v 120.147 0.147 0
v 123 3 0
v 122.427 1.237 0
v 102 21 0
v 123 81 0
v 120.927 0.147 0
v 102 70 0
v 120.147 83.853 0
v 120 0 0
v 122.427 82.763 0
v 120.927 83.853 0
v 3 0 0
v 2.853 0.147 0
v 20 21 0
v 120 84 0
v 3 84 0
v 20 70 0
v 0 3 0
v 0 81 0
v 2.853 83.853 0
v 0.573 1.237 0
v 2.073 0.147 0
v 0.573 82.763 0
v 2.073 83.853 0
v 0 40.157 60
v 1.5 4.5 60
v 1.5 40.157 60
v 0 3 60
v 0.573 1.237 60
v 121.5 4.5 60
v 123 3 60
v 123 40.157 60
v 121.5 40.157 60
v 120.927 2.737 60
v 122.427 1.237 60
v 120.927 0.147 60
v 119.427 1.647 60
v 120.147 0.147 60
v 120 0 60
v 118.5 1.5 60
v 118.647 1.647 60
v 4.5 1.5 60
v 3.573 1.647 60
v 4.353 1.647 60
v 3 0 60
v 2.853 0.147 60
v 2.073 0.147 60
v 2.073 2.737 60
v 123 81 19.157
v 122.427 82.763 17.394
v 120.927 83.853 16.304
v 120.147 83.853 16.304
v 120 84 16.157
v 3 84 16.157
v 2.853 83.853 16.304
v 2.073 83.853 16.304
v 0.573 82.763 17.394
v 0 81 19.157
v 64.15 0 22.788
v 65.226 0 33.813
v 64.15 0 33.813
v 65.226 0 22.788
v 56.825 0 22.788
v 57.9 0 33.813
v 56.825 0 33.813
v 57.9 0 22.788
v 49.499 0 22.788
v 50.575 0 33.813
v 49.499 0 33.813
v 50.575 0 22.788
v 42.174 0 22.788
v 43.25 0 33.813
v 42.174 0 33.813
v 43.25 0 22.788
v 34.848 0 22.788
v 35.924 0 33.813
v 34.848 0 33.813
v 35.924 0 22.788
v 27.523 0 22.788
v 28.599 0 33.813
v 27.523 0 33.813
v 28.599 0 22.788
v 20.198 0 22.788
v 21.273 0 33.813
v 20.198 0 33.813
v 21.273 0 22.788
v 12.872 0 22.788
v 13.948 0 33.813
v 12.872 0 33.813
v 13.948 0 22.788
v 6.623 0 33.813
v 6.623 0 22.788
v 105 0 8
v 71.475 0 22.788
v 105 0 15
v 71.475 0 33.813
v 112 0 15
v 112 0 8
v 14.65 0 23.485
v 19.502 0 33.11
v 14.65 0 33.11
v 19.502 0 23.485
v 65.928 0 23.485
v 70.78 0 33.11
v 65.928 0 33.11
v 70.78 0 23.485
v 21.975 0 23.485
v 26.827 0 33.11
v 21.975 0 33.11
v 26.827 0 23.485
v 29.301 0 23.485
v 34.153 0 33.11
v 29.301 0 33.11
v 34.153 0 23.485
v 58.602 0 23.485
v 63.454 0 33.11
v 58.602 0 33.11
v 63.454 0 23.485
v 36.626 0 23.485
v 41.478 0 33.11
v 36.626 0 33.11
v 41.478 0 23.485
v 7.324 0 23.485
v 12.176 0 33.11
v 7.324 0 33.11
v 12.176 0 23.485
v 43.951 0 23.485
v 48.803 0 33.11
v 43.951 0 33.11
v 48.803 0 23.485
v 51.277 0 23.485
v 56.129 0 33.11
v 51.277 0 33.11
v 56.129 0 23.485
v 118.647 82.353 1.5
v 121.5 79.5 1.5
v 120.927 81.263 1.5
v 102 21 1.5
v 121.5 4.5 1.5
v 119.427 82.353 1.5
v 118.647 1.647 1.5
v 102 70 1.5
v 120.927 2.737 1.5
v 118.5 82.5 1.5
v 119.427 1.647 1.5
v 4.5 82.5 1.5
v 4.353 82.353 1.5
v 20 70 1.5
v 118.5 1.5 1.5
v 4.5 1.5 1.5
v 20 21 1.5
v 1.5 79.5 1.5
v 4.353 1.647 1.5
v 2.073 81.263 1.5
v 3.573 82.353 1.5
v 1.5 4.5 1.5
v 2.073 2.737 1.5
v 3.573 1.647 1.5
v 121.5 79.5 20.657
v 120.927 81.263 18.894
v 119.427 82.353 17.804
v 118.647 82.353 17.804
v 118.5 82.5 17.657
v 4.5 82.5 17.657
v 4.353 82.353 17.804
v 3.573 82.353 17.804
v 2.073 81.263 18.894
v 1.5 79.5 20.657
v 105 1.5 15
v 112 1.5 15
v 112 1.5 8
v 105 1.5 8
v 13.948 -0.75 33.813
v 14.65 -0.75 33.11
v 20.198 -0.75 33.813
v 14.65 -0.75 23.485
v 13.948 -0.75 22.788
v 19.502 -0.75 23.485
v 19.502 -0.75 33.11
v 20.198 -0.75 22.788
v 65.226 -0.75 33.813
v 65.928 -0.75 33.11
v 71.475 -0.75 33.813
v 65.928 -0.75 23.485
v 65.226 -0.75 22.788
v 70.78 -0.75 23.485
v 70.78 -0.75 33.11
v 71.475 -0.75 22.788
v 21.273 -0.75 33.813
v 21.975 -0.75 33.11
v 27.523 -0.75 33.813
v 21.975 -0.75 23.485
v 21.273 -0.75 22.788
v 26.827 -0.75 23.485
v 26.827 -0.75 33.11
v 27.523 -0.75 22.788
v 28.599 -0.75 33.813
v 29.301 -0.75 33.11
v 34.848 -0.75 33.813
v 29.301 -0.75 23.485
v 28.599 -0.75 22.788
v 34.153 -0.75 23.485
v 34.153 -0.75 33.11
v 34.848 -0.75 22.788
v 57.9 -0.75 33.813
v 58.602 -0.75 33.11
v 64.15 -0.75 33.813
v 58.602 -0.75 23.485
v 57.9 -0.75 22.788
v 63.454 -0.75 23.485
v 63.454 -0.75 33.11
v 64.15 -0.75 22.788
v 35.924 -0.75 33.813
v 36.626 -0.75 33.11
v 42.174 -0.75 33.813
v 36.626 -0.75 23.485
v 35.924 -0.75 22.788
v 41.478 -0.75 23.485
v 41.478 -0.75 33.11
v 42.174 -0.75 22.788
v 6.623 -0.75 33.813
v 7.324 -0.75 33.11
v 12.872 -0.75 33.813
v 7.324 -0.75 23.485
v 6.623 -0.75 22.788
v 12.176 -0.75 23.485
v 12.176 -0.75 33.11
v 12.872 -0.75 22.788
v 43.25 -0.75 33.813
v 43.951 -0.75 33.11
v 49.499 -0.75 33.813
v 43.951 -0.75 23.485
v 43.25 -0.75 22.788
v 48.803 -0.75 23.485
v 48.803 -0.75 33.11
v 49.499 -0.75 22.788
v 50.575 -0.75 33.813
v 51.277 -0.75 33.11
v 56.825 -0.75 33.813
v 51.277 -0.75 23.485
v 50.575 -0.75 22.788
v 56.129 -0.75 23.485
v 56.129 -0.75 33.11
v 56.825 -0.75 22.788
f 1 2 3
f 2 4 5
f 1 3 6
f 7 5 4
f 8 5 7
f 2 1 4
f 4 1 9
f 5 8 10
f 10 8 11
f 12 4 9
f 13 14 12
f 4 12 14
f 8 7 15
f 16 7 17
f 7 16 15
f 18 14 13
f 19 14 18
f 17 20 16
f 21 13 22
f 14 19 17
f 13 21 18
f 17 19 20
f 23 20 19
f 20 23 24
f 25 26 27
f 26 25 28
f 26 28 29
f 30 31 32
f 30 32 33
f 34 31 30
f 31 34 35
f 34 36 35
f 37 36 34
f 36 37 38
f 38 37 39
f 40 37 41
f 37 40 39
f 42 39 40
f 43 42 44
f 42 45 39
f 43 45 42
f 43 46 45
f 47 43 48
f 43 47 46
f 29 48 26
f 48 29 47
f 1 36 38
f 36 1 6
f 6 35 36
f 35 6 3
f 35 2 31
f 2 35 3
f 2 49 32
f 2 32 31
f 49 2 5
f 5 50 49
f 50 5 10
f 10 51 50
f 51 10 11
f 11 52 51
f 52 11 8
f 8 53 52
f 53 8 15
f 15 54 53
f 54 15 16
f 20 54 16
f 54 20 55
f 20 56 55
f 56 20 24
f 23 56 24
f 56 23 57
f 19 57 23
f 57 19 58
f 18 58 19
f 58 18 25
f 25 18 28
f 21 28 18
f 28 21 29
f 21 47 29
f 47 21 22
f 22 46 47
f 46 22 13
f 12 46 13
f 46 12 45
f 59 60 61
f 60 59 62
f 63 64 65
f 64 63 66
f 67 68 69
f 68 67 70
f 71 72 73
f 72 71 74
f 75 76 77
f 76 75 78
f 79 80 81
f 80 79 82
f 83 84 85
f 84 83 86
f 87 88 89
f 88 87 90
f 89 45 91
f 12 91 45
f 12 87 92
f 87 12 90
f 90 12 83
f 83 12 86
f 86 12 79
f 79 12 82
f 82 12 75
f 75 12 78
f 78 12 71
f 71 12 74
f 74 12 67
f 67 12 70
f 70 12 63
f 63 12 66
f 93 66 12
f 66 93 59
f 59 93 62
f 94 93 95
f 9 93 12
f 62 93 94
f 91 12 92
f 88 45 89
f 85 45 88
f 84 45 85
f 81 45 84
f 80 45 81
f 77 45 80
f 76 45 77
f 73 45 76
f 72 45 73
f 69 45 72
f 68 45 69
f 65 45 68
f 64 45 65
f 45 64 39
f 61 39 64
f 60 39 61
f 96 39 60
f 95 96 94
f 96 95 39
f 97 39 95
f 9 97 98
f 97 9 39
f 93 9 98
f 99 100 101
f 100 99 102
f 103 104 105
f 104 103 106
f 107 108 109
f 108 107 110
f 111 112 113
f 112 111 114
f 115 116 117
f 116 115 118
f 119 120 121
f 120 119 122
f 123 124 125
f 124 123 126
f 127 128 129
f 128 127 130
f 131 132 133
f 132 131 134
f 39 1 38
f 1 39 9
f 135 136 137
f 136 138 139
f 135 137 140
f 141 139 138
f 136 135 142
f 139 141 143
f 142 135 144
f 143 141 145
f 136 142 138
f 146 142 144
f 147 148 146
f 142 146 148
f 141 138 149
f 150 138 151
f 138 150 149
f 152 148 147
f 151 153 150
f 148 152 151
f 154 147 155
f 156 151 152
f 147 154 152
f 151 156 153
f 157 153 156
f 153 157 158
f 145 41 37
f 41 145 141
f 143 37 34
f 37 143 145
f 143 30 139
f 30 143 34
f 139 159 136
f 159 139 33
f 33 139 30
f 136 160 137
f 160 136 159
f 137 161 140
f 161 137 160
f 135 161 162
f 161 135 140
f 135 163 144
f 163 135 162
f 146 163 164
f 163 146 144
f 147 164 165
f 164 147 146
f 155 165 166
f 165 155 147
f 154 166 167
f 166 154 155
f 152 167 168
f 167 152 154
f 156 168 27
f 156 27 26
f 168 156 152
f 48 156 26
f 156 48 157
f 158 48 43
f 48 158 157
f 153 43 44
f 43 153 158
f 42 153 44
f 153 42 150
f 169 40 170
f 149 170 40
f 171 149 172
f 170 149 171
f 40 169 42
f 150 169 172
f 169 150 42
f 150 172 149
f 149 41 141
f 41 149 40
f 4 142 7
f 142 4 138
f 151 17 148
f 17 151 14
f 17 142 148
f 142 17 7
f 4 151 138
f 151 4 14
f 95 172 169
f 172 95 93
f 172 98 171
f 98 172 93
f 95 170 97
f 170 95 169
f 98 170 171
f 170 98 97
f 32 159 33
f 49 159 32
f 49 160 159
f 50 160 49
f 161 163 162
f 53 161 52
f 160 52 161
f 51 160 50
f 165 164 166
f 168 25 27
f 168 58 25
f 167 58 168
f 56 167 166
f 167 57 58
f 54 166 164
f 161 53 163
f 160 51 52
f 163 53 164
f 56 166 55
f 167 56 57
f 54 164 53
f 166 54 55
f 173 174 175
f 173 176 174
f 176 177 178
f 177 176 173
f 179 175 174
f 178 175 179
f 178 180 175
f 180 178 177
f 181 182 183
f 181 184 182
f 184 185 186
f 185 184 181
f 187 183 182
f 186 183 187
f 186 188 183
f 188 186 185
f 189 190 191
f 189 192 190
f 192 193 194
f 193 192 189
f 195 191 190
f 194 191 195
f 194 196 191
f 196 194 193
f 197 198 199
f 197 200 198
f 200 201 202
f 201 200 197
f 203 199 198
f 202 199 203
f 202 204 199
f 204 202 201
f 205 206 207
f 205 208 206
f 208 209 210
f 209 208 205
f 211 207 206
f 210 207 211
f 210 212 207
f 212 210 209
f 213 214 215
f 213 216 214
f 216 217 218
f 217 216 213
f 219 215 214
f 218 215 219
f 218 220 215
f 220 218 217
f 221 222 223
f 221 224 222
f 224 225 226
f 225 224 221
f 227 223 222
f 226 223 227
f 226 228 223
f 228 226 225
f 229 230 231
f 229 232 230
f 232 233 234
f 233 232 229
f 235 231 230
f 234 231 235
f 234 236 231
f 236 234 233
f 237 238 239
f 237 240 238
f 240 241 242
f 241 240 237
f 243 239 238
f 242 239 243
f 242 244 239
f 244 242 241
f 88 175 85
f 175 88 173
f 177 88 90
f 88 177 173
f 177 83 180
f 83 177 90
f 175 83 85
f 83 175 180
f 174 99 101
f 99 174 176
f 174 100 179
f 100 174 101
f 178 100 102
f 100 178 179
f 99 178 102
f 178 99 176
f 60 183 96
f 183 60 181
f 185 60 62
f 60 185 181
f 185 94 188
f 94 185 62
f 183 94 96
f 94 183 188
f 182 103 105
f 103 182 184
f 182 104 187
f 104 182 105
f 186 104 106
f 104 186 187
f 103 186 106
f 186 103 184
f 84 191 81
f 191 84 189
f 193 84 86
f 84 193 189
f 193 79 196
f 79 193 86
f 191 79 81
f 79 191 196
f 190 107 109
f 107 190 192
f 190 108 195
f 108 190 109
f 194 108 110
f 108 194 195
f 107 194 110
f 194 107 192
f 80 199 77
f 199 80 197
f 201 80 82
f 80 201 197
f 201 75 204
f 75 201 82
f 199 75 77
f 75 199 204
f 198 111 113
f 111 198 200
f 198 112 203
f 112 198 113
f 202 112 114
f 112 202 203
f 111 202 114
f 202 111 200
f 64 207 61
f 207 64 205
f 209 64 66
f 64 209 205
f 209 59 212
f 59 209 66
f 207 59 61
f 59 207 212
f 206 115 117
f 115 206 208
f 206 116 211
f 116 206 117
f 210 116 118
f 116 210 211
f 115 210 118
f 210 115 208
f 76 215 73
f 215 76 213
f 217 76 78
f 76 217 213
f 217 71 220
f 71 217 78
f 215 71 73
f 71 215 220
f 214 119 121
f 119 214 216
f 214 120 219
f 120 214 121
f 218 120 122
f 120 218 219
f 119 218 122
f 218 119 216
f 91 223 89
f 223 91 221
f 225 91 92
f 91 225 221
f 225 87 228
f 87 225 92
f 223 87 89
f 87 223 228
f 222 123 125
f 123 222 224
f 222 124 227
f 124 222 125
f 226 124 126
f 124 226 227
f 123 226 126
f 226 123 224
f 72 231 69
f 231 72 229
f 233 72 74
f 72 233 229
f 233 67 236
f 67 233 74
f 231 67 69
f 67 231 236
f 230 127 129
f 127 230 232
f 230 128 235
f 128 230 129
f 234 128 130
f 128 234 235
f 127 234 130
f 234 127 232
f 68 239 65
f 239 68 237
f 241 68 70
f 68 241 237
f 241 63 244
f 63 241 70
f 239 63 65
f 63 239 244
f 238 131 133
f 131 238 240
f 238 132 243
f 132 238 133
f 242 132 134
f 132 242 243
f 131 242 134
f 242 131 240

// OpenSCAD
BaseWidth = 123;
BaseDepth = 84;
BaseHeight = 60;
CornerRadius = 3;
WallThickness = 1.5;
LCDScreenWidth=82;
LCDScreenHeight=49;
LCDScreenX=20;
LCDScreenY=21;

module RoundedRectangle($Width=BaseWidth, $Depth=BaseDepth, $Radius=CornerRadius) 
{
    polygon(points = [[$Radius, 0], [$Width-$Radius, 0],[$Width, $Radius], [$Width, $Depth-$Radius], [$Width-$Radius, $Depth], [$Radius, $Depth], [0, $Depth-$Radius], [0, $Radius]], paths=[[0,1,2,3,4,5,6,7]]);
        
    translate([$Radius,$Radius,0]){
        circle(r=$Radius);
    }        
    translate([$Width-$Radius,$Radius,0]){
        circle(r=$Radius);
    }
    
    translate([$Width-$Radius,$Depth-$Radius,0]){ 
        circle(r=$Radius);
    }
    
    translate([$Radius,$Depth-$Radius,0]){ 
        circle(r=$Radius);
    }
}


module base3D($Width=BaseWidth, $Depth=BaseDepth, $Height=BaseHeight, $Radius=CornerRadius, $Thickness=WallThickness)
{
    difference()
    {
        linear_extrude(height = $Height, center = false, convexity = 0, twist = 0)
        RoundedRectangle($Width, $Depth, $Radius);
        translate([$Thickness, $Thickness, $Thickness]) {
        linear_extrude(height = $Height, center = false, convexity = 0, twist = 0)
        RoundedRectangle($Width-$Thickness*2, $Depth-$Thickness*2, $Radius);
        }
    }
}


difference() {
    base3D(BaseWidth, BaseDepth, BaseHeight, CornerRadius, WallThickness);
    translate([LCDScreenX, LCDScreenY, 0]) {
        cube(size=[LCDScreenWidth, LCDScreenHeight, WallThickness], center=false);
    }
    translate([105, 0, 15]) {
        rotate([-90, 0, 0]){
            cube(size=[7, 7, WallThickness], center=false);
        }
    }


//    translate([LEDX, LEDY, 0]){
//        cylinder(h=WallThickness, r1=LEDRadius, r2=LEDRadius, center=false);
//    }
    translate([0, 200+28, 125+30]){
        rotate([135, 0, 0]){
            cube(size=[200, 200, 200], center=false);
        }
    }
}

/*
translate([13, 0, 30]){
 rotate([90, 0, 0]){
    linear_extrude(height = WallThickness/2){
        text("IBE Group, Inc.", size=9, font="Arial Black");
    }
 }
}

translate([11, 0, 10]){
 rotate([90, 0, 0]){
    linear_extrude(height = WallThickness/2){
        text("Copyright© 2018", size=7, font="Arial Black");
    }
 }
}
*/

translate([6, 0, 25]){
 rotate([90, 0, 0]){
    linear_extrude(height = WallThickness/2){
        text("小帝小薇古诗词练习", size=9, font="SimHei");
    }
 }
}


/*
difference() {
    translate([0, 0, 33]){
        rotate([45, 0, 0]){
            cube(size=[BaseWidth, BaseDepth/1.42, 200], center=false);
        }
    }

    translate([0, -2, 35]){
        rotate([45, 0, 0]){
            cube(size=[BaseWidth+2, BaseDepth/1.42+2, 200+2], center=false);
        }
    }
}
*/
